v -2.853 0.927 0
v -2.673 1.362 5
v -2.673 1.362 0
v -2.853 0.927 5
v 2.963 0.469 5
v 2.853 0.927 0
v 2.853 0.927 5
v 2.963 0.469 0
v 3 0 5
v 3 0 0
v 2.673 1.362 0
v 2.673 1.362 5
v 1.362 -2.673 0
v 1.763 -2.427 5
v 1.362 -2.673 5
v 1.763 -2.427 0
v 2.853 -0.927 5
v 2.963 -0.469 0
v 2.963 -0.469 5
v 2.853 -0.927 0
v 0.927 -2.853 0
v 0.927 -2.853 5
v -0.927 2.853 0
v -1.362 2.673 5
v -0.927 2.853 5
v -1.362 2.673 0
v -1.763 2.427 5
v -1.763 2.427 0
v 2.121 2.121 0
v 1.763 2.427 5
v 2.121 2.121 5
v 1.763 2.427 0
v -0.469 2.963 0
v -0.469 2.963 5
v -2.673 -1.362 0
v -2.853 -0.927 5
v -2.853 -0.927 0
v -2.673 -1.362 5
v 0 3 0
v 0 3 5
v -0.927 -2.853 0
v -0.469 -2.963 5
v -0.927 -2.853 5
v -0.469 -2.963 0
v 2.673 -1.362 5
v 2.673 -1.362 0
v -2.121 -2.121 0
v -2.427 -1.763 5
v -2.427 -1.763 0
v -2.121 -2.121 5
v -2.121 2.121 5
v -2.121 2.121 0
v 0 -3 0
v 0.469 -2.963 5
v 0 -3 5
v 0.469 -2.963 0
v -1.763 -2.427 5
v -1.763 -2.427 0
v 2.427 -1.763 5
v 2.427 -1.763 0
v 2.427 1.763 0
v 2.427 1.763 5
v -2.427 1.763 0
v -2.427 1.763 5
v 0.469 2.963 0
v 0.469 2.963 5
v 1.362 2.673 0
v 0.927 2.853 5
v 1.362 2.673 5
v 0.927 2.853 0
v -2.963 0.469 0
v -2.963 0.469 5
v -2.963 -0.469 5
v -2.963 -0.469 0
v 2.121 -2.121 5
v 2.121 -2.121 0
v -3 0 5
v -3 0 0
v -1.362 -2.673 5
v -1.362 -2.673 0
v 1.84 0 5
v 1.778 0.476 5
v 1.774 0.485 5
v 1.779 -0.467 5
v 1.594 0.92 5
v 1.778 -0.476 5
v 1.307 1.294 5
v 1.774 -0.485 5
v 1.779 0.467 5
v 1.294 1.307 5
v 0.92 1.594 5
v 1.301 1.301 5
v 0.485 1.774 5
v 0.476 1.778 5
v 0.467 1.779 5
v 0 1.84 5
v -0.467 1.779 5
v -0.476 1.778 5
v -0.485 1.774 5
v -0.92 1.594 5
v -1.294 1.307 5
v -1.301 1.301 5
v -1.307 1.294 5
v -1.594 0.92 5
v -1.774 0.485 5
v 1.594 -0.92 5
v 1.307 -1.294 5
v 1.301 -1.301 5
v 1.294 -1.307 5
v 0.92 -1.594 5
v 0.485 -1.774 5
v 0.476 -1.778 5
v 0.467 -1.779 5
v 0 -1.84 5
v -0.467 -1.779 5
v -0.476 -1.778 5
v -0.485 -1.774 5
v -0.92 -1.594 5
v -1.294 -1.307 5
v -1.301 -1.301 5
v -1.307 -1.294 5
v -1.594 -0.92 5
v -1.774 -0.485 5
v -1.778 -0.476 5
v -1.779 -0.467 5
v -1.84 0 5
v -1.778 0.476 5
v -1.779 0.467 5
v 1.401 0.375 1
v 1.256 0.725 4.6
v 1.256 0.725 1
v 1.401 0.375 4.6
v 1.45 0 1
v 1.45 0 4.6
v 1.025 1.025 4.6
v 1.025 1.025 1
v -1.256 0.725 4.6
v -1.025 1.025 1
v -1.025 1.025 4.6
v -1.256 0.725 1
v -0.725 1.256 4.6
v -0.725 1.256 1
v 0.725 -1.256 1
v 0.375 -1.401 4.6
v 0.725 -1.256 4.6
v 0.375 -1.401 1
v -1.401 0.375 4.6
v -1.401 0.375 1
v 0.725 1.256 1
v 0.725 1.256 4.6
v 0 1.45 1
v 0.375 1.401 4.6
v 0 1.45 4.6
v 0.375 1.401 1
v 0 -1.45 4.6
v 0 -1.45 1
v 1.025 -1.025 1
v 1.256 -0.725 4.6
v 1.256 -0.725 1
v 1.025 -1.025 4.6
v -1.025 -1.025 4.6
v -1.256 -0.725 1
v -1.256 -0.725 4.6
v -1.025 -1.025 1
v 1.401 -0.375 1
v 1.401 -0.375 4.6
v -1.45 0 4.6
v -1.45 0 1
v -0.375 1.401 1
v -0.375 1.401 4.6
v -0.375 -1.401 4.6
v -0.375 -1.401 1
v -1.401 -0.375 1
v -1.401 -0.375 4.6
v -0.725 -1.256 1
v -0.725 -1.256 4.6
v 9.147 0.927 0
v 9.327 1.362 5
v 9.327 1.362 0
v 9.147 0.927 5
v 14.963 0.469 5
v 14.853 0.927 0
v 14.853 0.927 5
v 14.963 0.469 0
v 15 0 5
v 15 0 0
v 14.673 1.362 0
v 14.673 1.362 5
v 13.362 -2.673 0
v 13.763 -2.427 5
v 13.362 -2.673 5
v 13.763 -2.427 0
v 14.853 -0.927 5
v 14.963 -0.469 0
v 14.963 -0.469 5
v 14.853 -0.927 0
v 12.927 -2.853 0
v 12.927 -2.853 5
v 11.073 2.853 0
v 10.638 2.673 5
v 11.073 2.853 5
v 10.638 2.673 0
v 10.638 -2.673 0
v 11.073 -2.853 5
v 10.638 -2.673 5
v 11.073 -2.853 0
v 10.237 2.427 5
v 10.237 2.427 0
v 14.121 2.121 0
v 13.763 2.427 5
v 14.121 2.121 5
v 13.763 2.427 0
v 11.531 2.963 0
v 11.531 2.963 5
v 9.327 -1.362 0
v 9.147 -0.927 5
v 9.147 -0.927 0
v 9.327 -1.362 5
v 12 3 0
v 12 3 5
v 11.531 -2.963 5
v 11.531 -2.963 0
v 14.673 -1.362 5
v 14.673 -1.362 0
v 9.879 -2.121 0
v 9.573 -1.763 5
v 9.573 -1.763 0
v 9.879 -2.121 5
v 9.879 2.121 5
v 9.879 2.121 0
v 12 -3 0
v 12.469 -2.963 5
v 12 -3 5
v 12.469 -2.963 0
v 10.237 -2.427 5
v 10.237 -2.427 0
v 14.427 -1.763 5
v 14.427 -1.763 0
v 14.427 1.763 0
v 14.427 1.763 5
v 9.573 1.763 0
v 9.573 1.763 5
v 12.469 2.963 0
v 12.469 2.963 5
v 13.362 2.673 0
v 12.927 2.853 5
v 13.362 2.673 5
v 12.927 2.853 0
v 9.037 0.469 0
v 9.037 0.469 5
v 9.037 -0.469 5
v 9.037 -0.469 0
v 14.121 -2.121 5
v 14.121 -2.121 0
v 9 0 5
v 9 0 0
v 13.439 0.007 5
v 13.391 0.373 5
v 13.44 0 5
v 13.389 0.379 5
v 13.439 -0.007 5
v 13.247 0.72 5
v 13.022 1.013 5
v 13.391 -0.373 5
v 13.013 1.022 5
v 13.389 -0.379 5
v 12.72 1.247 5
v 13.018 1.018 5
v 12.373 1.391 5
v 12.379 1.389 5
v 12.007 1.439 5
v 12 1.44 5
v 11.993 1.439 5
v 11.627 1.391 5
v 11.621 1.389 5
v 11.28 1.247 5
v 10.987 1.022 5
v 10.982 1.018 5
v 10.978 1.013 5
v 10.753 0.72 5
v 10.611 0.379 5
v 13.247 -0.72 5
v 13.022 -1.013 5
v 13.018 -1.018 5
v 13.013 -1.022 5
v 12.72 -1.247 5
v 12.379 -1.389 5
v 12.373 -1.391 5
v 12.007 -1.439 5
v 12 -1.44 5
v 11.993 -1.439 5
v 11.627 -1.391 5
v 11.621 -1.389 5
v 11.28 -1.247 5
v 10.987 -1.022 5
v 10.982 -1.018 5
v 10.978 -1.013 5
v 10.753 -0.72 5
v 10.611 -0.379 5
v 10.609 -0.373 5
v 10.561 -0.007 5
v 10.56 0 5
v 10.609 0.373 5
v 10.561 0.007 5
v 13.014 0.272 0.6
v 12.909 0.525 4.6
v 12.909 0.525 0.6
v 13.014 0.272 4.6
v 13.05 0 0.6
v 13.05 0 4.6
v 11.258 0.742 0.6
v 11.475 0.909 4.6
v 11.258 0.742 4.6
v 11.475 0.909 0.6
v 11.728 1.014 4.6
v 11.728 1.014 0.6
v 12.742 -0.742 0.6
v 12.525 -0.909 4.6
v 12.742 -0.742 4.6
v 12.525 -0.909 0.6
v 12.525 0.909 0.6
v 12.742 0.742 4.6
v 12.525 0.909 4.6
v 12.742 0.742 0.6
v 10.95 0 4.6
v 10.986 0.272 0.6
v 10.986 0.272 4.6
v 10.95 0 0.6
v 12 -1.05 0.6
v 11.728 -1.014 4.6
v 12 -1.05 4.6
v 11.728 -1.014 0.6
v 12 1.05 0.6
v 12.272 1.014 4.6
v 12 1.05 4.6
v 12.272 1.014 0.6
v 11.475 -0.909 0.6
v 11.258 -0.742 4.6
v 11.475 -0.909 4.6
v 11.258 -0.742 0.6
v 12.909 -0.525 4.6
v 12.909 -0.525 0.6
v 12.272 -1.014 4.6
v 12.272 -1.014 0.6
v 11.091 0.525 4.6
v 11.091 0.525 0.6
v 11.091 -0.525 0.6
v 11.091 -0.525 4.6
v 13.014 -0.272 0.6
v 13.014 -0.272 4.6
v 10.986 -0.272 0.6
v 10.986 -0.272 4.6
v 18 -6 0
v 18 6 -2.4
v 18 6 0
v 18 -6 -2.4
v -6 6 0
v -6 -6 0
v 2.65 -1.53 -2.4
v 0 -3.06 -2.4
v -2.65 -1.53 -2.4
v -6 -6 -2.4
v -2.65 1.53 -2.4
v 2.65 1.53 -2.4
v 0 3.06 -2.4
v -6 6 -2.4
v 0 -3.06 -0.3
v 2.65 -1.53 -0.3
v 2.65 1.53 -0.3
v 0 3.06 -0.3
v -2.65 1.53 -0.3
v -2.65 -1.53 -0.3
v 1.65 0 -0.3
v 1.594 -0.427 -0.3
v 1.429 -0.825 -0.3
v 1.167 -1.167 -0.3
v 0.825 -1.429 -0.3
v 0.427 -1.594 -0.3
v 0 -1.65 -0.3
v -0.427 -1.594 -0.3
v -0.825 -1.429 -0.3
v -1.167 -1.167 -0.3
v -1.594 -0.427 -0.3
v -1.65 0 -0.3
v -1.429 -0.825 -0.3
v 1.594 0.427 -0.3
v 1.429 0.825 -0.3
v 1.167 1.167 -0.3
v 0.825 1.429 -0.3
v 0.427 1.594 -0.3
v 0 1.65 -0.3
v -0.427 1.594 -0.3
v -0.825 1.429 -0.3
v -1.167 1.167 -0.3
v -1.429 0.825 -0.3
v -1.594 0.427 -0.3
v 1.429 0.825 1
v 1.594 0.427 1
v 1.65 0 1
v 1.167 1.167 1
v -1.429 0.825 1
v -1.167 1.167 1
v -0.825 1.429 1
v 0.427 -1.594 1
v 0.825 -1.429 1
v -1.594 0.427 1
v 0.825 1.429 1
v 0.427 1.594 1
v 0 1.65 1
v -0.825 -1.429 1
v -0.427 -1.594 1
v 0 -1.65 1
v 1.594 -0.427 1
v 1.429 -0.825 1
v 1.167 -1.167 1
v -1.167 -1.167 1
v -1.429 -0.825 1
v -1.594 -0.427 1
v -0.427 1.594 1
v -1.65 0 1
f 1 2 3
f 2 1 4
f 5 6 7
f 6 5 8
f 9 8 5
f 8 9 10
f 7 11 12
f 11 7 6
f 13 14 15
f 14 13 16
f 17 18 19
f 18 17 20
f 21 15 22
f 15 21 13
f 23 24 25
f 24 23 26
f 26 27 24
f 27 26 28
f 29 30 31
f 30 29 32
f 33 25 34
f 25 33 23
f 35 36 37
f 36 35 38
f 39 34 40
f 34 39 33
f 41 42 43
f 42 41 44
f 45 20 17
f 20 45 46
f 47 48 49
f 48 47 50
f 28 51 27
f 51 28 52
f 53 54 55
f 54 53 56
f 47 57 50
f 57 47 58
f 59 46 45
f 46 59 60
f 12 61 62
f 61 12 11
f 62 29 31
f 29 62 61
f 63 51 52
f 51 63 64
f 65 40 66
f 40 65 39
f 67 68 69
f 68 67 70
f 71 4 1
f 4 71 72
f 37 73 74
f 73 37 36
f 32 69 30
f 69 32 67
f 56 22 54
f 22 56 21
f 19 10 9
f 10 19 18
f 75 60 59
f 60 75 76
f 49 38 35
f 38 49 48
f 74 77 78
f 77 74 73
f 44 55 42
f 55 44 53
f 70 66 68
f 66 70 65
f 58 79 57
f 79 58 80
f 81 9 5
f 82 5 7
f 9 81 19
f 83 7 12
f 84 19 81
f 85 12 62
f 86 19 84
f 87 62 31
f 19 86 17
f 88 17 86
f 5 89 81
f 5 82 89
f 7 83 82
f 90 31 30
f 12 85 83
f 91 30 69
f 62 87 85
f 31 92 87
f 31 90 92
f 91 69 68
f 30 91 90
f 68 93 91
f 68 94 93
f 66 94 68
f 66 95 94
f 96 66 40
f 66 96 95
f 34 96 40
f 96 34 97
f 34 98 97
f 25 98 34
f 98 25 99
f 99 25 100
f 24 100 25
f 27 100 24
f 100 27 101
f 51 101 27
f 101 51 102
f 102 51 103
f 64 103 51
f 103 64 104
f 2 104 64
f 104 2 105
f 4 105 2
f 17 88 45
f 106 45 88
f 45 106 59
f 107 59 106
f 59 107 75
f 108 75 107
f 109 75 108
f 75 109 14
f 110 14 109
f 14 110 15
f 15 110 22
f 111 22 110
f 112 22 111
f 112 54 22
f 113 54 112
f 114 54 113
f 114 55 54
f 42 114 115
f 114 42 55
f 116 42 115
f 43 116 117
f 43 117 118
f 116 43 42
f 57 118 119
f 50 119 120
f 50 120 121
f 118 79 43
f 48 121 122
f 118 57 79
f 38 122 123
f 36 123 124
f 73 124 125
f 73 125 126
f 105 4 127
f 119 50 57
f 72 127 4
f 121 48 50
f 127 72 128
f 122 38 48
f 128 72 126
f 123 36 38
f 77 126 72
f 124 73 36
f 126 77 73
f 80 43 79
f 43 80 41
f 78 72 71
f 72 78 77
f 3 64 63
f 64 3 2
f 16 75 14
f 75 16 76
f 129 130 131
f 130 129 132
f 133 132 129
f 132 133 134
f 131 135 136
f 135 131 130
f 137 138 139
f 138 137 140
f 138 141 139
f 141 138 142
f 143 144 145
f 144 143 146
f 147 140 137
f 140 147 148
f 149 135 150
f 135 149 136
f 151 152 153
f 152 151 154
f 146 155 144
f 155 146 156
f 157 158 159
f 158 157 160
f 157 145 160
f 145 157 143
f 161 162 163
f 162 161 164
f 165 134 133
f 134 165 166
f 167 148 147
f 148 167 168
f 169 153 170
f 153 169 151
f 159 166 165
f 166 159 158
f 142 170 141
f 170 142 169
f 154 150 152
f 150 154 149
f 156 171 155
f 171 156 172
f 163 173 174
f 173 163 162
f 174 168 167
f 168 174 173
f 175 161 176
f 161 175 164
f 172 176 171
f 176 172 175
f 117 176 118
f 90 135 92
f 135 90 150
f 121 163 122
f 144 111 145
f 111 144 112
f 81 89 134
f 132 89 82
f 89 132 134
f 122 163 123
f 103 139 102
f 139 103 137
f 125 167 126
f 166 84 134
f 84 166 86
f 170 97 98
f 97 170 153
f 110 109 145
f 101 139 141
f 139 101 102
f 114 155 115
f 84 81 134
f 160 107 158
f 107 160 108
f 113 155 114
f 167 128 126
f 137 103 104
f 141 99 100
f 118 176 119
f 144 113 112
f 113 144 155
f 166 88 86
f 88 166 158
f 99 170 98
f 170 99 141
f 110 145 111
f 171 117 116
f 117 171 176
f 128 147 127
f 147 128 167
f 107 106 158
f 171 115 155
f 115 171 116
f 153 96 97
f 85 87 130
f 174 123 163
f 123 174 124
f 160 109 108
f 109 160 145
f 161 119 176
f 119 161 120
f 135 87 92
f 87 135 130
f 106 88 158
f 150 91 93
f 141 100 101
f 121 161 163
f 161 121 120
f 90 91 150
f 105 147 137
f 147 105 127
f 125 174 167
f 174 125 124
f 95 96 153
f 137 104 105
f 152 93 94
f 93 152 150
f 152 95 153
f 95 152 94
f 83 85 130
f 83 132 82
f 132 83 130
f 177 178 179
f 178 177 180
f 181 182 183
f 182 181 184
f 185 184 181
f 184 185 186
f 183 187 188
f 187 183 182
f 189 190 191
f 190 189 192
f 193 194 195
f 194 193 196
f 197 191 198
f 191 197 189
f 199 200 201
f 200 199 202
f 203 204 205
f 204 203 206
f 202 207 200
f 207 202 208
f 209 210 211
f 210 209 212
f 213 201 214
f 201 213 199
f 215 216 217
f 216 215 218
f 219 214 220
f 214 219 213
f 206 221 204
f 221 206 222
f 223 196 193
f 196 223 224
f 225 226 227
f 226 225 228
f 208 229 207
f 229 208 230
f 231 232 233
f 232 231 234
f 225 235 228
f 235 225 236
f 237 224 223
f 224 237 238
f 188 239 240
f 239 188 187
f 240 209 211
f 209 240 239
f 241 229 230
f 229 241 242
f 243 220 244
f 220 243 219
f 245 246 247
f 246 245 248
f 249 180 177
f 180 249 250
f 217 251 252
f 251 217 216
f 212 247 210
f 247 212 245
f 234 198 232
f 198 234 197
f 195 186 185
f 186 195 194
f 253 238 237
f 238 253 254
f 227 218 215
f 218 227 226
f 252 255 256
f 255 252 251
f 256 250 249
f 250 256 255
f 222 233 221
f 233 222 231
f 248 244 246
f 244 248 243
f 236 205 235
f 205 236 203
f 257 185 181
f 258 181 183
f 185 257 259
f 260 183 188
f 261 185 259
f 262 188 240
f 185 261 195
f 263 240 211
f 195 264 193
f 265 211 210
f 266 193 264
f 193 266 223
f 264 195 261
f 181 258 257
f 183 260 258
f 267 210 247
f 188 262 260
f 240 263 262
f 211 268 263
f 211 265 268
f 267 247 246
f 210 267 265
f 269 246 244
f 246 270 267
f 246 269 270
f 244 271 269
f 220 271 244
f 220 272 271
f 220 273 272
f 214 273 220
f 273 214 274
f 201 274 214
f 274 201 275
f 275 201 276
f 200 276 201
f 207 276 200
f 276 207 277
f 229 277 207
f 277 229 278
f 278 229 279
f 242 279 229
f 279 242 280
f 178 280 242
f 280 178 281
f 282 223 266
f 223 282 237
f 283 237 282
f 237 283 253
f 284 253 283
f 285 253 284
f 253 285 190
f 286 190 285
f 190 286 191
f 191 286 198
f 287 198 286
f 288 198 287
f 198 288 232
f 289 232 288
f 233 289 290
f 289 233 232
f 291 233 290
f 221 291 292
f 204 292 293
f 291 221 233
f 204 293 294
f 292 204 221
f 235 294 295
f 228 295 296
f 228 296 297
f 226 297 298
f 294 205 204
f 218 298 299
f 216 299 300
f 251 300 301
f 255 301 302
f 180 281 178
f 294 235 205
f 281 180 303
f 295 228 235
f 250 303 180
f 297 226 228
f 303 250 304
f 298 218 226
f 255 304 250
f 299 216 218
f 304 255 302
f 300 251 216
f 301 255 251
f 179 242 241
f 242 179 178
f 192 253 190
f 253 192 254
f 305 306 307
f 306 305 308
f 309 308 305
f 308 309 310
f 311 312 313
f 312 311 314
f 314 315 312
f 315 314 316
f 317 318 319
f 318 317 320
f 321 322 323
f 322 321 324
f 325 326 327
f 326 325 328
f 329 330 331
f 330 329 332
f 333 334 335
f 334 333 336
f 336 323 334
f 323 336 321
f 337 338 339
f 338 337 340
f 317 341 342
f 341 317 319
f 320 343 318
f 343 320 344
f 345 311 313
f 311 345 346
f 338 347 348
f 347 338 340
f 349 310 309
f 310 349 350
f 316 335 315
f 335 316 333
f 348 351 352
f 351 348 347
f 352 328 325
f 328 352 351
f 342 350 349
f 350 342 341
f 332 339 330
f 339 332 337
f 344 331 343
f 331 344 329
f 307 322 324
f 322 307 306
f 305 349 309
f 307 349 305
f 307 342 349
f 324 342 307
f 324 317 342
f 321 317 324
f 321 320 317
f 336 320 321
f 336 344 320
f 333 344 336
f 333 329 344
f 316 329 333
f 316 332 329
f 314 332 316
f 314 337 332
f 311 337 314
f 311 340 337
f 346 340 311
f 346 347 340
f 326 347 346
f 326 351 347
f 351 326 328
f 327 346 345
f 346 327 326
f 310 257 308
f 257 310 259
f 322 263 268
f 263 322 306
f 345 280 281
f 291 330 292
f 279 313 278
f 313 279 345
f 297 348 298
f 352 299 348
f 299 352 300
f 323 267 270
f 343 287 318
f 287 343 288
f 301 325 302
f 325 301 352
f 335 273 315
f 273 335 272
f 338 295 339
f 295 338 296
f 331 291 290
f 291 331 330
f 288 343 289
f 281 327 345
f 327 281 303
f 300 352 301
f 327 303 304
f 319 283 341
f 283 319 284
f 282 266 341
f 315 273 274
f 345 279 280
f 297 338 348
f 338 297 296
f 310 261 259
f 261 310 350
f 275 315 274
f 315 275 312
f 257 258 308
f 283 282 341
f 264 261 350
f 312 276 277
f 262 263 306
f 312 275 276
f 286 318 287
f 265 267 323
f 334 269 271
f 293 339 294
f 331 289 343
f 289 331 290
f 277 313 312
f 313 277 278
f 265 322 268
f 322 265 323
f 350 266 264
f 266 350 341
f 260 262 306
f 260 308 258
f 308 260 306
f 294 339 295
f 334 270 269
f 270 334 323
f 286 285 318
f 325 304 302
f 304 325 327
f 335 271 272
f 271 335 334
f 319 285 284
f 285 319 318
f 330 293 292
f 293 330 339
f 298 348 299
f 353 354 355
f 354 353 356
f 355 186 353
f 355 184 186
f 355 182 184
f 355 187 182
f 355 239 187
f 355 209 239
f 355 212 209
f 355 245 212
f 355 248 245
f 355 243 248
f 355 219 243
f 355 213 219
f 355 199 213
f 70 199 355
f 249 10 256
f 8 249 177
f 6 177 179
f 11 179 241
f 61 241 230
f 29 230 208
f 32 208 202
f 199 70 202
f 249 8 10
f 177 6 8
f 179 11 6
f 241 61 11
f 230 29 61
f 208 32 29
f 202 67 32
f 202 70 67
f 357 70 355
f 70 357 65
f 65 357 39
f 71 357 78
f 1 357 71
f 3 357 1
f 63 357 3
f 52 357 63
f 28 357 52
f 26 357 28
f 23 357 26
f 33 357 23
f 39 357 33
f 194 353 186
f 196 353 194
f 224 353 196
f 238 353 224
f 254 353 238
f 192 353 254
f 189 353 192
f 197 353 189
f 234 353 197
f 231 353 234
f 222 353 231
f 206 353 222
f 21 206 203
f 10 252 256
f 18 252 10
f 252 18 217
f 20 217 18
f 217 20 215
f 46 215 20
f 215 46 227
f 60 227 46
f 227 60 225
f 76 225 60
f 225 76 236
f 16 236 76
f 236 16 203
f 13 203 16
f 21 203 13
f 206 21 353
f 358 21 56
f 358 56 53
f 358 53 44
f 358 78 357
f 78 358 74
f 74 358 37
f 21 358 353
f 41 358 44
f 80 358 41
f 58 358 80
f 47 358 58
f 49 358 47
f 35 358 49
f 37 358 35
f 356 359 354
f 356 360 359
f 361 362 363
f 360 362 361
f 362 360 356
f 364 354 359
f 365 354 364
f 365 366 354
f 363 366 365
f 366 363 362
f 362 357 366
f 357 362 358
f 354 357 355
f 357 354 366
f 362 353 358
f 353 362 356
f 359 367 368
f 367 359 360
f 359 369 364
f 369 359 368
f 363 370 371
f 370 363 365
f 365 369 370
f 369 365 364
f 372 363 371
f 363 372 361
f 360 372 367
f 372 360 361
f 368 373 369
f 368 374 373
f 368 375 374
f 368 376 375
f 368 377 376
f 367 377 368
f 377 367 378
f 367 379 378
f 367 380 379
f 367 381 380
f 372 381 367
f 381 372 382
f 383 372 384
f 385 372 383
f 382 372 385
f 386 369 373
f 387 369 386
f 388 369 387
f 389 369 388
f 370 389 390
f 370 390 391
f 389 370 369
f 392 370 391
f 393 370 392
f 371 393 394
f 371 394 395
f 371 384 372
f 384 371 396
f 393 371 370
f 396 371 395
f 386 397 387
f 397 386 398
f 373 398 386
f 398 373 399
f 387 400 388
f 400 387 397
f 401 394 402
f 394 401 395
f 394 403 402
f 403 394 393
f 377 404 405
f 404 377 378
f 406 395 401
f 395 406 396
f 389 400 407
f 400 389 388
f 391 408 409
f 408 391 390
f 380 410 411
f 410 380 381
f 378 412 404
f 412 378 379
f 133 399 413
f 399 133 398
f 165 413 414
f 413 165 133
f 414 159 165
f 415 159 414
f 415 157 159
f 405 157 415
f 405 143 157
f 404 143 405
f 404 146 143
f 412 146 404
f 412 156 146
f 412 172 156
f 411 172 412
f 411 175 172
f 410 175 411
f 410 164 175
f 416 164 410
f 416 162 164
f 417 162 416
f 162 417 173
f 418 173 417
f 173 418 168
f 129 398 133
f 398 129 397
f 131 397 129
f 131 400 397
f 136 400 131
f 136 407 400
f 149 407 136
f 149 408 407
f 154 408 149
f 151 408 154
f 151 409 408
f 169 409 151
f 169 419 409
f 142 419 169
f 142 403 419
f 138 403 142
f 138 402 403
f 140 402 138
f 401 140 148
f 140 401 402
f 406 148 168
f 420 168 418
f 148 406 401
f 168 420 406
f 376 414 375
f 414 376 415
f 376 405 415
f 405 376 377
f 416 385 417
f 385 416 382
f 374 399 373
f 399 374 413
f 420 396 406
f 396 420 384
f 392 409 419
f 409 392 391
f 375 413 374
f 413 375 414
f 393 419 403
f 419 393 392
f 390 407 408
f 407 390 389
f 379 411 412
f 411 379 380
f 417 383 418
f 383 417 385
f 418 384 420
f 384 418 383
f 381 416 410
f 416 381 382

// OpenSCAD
// file: ../screw-post.scad
//-----------------------------------------------------------------------
// Screw post: a round post off the floor that a board screws down onto
//
// Two ways to fix:
//   "nut"  clearance hole through the post and floor; the nut sits in a hex
//          trap in the floor's underside, so the screw goes in from the top
//   "tap"  a pilot hole the screw cuts its own thread in (one or two fittings
//          in PLA/PETG); blind, the floor stays whole underneath
// and "head" for a screw up from below (head in a counterbore, nut on top).
//
// Modules, all in the same frame:
//   screwPostGhost()     the screw (and nut), for previews
//   screwPost()          the post: add to the floor
//   screwPostFloorCut()  subtract from the floor: nut trap / counterbore and hole
//
// Frame: origin on the floor top, on the post's axis. Z up; the floor is
// Z = -floorThick .. 0. Units: mm.
//
// Sizes: "M2", "M2.5", "M3". screwPostScrew(size, ...) says which screw length
// reaches, so a project can assert it has that screw in the kit.
//-----------------------------------------------------------------------

//-- [name, screw Ø, nut across flats, nut thick, head Ø, head height, tap hole, post Ø]
//-- Nuts ISO 4032; heads ISO 7380 button. Tap holes: the usual ~0.8 x Ø for plastic
screwSizes = [
  ["M2",   2.0, 4.0, 1.6, 3.5, 1.1, 1.6, 5.0],
  ["M2.5", 2.5, 5.0, 2.0, 4.4, 1.4, 2.1, 6.0],    // head 4.4: measured on the kit's M2.5 (controller base)
  ["M3",   3.0, 5.5, 2.4, 5.7, 1.65, 2.5, 7.0],
];

screwHoleClear = 0.4;     // added to the screw Ø for a clearance hole
screwNutClear  = 0.3;     // CAL: across flats, nut trap over the nut. Set by the fit piece
screwTapClear  = 0.0;     // CAL: added to the tap hole. Set by the fit piece
screwHeadClear = 0.6;     // counterbore over the head Ø

function screwSize(size) = let (i = search([size], screwSizes)[0])
  assert(i != [] && i != undef, str("unknown screw size ", size)) screwSizes[i];
function screwDia(size)    = screwSize(size)[1];
function screwNutAF(size)  = screwSize(size)[2];
function screwNutH(size)   = screwSize(size)[3];
function screwHeadDia(size)= screwSize(size)[4];
function screwHeadH(size)  = screwSize(size)[5];
function screwPostDia(size)= screwSize(size)[7];

//-- Shortest screw that fills the nut, from the top of the clamped part (h + clamp
//-- above the floor) down to the nut trap's underside. Round up to a length you have.
function screwPostScrew(size, h, floorThick, clamp = 1.6) = h + clamp + floorThick;

module screwPostGhost(size, h, floorThick, clamp = 1.6, length, how = "nut")
{
  d = screwDia(size);
  L = is_undef(length) ? screwPostScrew(size, h, floorThick, clamp) : length;
  top = h + clamp;
  if (how == "head")
  {
    %color("Silver") translate([0, 0, -floorThick]) cylinder(d = screwHeadDia(size), h = screwHeadH(size), $fn = 24);
    %color("Silver") translate([0, 0, -floorThick + screwHeadH(size)]) cylinder(d = d, h = L, $fn = 16);
  }
  else
  {
    %color("Silver") translate([0, 0, top]) cylinder(d = screwHeadDia(size), h = screwHeadH(size), $fn = 24);
    %color("Silver") translate([0, 0, top - L]) cylinder(d = d, h = L, $fn = 16);
    if (how == "nut")
      %color("DimGray") translate([0, 0, -floorThick]) rotate([0, 0, 30]) cylinder(d = screwNutAF(size)/cos(30), h = screwNutH(size), $fn = 6);
  }
}

//-- how: "nut" | "head" (through hole) or "tap" (blind pilot hole). postDia defaults by size
module screwPost(size, h, how = "nut", postDia, tapClear = screwTapClear)
{
  pd = is_undef(postDia) ? screwPostDia(size) : postDia;
  hole = how == "tap" ? screwSize(size)[6] + tapClear : screwDia(size) + screwHoleClear;
  difference()
  {
    translate([0, 0, -0.01]) cylinder(d = pd, h = h + 0.01, $fn = 40);
    translate([0, 0, how == "tap" ? 0.6 : -1]) cylinder(d = hole, h = h + 2, $fn = 24);
    //-- lead-in so the screw starts square
    translate([0, 0, h - 0.4]) cylinder(d1 = hole, d2 = hole + 0.8, h = 0.41, $fn = 24);
  }
}

//-- "nut": hex trap from the underside, opening a little over the nut so it sits flush.
//-- "head": counterbore for the head. "tap": nothing.
module screwPostFloorCut(size, floorThick, how = "nut", nutClear = screwNutClear)
{
  d = screwDia(size) + screwHoleClear;
  if (how == "nut")
  {
    af = screwNutAF(size) + nutClear;
    translate([0, 0, -floorThick - 1]) rotate([0, 0, 30]) cylinder(d = af/cos(30), h = screwNutH(size) + 0.1 + 1, $fn = 6);
    translate([0, 0, -floorThick - 1]) cylinder(d = d + 0.4, h = floorThick + 2, $fn = 24);
  }
  if (how == "head")
  {
    translate([0, 0, -floorThick - 1]) cylinder(d = screwHeadDia(size) + screwHeadClear, h = screwHeadH(size) + 0.2 + 1, $fn = 32);
    translate([0, 0, -floorThick - 1]) cylinder(d = d + 0.4, h = floorThick + 2, $fn = 24);
  }
  assert(how == "tap" || floorThick >= (how == "nut" ? screwNutH(size) : screwHeadH(size)) + 0.1 + 0.3,
         str("floor too thin for the ", size, " ", how));
}
// main file
// One post of each kind on a piece of floor, for the catalogue: M2.5, nut trap and tap.
use <../screw-post.scad>

size       = "M2.5";
h          = 5;
floorThick = 2.4;

difference()
{
  union()
  {
    translate([-6, -6, -floorThick]) cube([24, 12, floorThick]);
    screwPost(size, h, "nut");
    translate([12, 0, 0]) screwPost(size, h, "tap");
  }
  screwPostFloorCut(size, floorThick, "nut");
}
